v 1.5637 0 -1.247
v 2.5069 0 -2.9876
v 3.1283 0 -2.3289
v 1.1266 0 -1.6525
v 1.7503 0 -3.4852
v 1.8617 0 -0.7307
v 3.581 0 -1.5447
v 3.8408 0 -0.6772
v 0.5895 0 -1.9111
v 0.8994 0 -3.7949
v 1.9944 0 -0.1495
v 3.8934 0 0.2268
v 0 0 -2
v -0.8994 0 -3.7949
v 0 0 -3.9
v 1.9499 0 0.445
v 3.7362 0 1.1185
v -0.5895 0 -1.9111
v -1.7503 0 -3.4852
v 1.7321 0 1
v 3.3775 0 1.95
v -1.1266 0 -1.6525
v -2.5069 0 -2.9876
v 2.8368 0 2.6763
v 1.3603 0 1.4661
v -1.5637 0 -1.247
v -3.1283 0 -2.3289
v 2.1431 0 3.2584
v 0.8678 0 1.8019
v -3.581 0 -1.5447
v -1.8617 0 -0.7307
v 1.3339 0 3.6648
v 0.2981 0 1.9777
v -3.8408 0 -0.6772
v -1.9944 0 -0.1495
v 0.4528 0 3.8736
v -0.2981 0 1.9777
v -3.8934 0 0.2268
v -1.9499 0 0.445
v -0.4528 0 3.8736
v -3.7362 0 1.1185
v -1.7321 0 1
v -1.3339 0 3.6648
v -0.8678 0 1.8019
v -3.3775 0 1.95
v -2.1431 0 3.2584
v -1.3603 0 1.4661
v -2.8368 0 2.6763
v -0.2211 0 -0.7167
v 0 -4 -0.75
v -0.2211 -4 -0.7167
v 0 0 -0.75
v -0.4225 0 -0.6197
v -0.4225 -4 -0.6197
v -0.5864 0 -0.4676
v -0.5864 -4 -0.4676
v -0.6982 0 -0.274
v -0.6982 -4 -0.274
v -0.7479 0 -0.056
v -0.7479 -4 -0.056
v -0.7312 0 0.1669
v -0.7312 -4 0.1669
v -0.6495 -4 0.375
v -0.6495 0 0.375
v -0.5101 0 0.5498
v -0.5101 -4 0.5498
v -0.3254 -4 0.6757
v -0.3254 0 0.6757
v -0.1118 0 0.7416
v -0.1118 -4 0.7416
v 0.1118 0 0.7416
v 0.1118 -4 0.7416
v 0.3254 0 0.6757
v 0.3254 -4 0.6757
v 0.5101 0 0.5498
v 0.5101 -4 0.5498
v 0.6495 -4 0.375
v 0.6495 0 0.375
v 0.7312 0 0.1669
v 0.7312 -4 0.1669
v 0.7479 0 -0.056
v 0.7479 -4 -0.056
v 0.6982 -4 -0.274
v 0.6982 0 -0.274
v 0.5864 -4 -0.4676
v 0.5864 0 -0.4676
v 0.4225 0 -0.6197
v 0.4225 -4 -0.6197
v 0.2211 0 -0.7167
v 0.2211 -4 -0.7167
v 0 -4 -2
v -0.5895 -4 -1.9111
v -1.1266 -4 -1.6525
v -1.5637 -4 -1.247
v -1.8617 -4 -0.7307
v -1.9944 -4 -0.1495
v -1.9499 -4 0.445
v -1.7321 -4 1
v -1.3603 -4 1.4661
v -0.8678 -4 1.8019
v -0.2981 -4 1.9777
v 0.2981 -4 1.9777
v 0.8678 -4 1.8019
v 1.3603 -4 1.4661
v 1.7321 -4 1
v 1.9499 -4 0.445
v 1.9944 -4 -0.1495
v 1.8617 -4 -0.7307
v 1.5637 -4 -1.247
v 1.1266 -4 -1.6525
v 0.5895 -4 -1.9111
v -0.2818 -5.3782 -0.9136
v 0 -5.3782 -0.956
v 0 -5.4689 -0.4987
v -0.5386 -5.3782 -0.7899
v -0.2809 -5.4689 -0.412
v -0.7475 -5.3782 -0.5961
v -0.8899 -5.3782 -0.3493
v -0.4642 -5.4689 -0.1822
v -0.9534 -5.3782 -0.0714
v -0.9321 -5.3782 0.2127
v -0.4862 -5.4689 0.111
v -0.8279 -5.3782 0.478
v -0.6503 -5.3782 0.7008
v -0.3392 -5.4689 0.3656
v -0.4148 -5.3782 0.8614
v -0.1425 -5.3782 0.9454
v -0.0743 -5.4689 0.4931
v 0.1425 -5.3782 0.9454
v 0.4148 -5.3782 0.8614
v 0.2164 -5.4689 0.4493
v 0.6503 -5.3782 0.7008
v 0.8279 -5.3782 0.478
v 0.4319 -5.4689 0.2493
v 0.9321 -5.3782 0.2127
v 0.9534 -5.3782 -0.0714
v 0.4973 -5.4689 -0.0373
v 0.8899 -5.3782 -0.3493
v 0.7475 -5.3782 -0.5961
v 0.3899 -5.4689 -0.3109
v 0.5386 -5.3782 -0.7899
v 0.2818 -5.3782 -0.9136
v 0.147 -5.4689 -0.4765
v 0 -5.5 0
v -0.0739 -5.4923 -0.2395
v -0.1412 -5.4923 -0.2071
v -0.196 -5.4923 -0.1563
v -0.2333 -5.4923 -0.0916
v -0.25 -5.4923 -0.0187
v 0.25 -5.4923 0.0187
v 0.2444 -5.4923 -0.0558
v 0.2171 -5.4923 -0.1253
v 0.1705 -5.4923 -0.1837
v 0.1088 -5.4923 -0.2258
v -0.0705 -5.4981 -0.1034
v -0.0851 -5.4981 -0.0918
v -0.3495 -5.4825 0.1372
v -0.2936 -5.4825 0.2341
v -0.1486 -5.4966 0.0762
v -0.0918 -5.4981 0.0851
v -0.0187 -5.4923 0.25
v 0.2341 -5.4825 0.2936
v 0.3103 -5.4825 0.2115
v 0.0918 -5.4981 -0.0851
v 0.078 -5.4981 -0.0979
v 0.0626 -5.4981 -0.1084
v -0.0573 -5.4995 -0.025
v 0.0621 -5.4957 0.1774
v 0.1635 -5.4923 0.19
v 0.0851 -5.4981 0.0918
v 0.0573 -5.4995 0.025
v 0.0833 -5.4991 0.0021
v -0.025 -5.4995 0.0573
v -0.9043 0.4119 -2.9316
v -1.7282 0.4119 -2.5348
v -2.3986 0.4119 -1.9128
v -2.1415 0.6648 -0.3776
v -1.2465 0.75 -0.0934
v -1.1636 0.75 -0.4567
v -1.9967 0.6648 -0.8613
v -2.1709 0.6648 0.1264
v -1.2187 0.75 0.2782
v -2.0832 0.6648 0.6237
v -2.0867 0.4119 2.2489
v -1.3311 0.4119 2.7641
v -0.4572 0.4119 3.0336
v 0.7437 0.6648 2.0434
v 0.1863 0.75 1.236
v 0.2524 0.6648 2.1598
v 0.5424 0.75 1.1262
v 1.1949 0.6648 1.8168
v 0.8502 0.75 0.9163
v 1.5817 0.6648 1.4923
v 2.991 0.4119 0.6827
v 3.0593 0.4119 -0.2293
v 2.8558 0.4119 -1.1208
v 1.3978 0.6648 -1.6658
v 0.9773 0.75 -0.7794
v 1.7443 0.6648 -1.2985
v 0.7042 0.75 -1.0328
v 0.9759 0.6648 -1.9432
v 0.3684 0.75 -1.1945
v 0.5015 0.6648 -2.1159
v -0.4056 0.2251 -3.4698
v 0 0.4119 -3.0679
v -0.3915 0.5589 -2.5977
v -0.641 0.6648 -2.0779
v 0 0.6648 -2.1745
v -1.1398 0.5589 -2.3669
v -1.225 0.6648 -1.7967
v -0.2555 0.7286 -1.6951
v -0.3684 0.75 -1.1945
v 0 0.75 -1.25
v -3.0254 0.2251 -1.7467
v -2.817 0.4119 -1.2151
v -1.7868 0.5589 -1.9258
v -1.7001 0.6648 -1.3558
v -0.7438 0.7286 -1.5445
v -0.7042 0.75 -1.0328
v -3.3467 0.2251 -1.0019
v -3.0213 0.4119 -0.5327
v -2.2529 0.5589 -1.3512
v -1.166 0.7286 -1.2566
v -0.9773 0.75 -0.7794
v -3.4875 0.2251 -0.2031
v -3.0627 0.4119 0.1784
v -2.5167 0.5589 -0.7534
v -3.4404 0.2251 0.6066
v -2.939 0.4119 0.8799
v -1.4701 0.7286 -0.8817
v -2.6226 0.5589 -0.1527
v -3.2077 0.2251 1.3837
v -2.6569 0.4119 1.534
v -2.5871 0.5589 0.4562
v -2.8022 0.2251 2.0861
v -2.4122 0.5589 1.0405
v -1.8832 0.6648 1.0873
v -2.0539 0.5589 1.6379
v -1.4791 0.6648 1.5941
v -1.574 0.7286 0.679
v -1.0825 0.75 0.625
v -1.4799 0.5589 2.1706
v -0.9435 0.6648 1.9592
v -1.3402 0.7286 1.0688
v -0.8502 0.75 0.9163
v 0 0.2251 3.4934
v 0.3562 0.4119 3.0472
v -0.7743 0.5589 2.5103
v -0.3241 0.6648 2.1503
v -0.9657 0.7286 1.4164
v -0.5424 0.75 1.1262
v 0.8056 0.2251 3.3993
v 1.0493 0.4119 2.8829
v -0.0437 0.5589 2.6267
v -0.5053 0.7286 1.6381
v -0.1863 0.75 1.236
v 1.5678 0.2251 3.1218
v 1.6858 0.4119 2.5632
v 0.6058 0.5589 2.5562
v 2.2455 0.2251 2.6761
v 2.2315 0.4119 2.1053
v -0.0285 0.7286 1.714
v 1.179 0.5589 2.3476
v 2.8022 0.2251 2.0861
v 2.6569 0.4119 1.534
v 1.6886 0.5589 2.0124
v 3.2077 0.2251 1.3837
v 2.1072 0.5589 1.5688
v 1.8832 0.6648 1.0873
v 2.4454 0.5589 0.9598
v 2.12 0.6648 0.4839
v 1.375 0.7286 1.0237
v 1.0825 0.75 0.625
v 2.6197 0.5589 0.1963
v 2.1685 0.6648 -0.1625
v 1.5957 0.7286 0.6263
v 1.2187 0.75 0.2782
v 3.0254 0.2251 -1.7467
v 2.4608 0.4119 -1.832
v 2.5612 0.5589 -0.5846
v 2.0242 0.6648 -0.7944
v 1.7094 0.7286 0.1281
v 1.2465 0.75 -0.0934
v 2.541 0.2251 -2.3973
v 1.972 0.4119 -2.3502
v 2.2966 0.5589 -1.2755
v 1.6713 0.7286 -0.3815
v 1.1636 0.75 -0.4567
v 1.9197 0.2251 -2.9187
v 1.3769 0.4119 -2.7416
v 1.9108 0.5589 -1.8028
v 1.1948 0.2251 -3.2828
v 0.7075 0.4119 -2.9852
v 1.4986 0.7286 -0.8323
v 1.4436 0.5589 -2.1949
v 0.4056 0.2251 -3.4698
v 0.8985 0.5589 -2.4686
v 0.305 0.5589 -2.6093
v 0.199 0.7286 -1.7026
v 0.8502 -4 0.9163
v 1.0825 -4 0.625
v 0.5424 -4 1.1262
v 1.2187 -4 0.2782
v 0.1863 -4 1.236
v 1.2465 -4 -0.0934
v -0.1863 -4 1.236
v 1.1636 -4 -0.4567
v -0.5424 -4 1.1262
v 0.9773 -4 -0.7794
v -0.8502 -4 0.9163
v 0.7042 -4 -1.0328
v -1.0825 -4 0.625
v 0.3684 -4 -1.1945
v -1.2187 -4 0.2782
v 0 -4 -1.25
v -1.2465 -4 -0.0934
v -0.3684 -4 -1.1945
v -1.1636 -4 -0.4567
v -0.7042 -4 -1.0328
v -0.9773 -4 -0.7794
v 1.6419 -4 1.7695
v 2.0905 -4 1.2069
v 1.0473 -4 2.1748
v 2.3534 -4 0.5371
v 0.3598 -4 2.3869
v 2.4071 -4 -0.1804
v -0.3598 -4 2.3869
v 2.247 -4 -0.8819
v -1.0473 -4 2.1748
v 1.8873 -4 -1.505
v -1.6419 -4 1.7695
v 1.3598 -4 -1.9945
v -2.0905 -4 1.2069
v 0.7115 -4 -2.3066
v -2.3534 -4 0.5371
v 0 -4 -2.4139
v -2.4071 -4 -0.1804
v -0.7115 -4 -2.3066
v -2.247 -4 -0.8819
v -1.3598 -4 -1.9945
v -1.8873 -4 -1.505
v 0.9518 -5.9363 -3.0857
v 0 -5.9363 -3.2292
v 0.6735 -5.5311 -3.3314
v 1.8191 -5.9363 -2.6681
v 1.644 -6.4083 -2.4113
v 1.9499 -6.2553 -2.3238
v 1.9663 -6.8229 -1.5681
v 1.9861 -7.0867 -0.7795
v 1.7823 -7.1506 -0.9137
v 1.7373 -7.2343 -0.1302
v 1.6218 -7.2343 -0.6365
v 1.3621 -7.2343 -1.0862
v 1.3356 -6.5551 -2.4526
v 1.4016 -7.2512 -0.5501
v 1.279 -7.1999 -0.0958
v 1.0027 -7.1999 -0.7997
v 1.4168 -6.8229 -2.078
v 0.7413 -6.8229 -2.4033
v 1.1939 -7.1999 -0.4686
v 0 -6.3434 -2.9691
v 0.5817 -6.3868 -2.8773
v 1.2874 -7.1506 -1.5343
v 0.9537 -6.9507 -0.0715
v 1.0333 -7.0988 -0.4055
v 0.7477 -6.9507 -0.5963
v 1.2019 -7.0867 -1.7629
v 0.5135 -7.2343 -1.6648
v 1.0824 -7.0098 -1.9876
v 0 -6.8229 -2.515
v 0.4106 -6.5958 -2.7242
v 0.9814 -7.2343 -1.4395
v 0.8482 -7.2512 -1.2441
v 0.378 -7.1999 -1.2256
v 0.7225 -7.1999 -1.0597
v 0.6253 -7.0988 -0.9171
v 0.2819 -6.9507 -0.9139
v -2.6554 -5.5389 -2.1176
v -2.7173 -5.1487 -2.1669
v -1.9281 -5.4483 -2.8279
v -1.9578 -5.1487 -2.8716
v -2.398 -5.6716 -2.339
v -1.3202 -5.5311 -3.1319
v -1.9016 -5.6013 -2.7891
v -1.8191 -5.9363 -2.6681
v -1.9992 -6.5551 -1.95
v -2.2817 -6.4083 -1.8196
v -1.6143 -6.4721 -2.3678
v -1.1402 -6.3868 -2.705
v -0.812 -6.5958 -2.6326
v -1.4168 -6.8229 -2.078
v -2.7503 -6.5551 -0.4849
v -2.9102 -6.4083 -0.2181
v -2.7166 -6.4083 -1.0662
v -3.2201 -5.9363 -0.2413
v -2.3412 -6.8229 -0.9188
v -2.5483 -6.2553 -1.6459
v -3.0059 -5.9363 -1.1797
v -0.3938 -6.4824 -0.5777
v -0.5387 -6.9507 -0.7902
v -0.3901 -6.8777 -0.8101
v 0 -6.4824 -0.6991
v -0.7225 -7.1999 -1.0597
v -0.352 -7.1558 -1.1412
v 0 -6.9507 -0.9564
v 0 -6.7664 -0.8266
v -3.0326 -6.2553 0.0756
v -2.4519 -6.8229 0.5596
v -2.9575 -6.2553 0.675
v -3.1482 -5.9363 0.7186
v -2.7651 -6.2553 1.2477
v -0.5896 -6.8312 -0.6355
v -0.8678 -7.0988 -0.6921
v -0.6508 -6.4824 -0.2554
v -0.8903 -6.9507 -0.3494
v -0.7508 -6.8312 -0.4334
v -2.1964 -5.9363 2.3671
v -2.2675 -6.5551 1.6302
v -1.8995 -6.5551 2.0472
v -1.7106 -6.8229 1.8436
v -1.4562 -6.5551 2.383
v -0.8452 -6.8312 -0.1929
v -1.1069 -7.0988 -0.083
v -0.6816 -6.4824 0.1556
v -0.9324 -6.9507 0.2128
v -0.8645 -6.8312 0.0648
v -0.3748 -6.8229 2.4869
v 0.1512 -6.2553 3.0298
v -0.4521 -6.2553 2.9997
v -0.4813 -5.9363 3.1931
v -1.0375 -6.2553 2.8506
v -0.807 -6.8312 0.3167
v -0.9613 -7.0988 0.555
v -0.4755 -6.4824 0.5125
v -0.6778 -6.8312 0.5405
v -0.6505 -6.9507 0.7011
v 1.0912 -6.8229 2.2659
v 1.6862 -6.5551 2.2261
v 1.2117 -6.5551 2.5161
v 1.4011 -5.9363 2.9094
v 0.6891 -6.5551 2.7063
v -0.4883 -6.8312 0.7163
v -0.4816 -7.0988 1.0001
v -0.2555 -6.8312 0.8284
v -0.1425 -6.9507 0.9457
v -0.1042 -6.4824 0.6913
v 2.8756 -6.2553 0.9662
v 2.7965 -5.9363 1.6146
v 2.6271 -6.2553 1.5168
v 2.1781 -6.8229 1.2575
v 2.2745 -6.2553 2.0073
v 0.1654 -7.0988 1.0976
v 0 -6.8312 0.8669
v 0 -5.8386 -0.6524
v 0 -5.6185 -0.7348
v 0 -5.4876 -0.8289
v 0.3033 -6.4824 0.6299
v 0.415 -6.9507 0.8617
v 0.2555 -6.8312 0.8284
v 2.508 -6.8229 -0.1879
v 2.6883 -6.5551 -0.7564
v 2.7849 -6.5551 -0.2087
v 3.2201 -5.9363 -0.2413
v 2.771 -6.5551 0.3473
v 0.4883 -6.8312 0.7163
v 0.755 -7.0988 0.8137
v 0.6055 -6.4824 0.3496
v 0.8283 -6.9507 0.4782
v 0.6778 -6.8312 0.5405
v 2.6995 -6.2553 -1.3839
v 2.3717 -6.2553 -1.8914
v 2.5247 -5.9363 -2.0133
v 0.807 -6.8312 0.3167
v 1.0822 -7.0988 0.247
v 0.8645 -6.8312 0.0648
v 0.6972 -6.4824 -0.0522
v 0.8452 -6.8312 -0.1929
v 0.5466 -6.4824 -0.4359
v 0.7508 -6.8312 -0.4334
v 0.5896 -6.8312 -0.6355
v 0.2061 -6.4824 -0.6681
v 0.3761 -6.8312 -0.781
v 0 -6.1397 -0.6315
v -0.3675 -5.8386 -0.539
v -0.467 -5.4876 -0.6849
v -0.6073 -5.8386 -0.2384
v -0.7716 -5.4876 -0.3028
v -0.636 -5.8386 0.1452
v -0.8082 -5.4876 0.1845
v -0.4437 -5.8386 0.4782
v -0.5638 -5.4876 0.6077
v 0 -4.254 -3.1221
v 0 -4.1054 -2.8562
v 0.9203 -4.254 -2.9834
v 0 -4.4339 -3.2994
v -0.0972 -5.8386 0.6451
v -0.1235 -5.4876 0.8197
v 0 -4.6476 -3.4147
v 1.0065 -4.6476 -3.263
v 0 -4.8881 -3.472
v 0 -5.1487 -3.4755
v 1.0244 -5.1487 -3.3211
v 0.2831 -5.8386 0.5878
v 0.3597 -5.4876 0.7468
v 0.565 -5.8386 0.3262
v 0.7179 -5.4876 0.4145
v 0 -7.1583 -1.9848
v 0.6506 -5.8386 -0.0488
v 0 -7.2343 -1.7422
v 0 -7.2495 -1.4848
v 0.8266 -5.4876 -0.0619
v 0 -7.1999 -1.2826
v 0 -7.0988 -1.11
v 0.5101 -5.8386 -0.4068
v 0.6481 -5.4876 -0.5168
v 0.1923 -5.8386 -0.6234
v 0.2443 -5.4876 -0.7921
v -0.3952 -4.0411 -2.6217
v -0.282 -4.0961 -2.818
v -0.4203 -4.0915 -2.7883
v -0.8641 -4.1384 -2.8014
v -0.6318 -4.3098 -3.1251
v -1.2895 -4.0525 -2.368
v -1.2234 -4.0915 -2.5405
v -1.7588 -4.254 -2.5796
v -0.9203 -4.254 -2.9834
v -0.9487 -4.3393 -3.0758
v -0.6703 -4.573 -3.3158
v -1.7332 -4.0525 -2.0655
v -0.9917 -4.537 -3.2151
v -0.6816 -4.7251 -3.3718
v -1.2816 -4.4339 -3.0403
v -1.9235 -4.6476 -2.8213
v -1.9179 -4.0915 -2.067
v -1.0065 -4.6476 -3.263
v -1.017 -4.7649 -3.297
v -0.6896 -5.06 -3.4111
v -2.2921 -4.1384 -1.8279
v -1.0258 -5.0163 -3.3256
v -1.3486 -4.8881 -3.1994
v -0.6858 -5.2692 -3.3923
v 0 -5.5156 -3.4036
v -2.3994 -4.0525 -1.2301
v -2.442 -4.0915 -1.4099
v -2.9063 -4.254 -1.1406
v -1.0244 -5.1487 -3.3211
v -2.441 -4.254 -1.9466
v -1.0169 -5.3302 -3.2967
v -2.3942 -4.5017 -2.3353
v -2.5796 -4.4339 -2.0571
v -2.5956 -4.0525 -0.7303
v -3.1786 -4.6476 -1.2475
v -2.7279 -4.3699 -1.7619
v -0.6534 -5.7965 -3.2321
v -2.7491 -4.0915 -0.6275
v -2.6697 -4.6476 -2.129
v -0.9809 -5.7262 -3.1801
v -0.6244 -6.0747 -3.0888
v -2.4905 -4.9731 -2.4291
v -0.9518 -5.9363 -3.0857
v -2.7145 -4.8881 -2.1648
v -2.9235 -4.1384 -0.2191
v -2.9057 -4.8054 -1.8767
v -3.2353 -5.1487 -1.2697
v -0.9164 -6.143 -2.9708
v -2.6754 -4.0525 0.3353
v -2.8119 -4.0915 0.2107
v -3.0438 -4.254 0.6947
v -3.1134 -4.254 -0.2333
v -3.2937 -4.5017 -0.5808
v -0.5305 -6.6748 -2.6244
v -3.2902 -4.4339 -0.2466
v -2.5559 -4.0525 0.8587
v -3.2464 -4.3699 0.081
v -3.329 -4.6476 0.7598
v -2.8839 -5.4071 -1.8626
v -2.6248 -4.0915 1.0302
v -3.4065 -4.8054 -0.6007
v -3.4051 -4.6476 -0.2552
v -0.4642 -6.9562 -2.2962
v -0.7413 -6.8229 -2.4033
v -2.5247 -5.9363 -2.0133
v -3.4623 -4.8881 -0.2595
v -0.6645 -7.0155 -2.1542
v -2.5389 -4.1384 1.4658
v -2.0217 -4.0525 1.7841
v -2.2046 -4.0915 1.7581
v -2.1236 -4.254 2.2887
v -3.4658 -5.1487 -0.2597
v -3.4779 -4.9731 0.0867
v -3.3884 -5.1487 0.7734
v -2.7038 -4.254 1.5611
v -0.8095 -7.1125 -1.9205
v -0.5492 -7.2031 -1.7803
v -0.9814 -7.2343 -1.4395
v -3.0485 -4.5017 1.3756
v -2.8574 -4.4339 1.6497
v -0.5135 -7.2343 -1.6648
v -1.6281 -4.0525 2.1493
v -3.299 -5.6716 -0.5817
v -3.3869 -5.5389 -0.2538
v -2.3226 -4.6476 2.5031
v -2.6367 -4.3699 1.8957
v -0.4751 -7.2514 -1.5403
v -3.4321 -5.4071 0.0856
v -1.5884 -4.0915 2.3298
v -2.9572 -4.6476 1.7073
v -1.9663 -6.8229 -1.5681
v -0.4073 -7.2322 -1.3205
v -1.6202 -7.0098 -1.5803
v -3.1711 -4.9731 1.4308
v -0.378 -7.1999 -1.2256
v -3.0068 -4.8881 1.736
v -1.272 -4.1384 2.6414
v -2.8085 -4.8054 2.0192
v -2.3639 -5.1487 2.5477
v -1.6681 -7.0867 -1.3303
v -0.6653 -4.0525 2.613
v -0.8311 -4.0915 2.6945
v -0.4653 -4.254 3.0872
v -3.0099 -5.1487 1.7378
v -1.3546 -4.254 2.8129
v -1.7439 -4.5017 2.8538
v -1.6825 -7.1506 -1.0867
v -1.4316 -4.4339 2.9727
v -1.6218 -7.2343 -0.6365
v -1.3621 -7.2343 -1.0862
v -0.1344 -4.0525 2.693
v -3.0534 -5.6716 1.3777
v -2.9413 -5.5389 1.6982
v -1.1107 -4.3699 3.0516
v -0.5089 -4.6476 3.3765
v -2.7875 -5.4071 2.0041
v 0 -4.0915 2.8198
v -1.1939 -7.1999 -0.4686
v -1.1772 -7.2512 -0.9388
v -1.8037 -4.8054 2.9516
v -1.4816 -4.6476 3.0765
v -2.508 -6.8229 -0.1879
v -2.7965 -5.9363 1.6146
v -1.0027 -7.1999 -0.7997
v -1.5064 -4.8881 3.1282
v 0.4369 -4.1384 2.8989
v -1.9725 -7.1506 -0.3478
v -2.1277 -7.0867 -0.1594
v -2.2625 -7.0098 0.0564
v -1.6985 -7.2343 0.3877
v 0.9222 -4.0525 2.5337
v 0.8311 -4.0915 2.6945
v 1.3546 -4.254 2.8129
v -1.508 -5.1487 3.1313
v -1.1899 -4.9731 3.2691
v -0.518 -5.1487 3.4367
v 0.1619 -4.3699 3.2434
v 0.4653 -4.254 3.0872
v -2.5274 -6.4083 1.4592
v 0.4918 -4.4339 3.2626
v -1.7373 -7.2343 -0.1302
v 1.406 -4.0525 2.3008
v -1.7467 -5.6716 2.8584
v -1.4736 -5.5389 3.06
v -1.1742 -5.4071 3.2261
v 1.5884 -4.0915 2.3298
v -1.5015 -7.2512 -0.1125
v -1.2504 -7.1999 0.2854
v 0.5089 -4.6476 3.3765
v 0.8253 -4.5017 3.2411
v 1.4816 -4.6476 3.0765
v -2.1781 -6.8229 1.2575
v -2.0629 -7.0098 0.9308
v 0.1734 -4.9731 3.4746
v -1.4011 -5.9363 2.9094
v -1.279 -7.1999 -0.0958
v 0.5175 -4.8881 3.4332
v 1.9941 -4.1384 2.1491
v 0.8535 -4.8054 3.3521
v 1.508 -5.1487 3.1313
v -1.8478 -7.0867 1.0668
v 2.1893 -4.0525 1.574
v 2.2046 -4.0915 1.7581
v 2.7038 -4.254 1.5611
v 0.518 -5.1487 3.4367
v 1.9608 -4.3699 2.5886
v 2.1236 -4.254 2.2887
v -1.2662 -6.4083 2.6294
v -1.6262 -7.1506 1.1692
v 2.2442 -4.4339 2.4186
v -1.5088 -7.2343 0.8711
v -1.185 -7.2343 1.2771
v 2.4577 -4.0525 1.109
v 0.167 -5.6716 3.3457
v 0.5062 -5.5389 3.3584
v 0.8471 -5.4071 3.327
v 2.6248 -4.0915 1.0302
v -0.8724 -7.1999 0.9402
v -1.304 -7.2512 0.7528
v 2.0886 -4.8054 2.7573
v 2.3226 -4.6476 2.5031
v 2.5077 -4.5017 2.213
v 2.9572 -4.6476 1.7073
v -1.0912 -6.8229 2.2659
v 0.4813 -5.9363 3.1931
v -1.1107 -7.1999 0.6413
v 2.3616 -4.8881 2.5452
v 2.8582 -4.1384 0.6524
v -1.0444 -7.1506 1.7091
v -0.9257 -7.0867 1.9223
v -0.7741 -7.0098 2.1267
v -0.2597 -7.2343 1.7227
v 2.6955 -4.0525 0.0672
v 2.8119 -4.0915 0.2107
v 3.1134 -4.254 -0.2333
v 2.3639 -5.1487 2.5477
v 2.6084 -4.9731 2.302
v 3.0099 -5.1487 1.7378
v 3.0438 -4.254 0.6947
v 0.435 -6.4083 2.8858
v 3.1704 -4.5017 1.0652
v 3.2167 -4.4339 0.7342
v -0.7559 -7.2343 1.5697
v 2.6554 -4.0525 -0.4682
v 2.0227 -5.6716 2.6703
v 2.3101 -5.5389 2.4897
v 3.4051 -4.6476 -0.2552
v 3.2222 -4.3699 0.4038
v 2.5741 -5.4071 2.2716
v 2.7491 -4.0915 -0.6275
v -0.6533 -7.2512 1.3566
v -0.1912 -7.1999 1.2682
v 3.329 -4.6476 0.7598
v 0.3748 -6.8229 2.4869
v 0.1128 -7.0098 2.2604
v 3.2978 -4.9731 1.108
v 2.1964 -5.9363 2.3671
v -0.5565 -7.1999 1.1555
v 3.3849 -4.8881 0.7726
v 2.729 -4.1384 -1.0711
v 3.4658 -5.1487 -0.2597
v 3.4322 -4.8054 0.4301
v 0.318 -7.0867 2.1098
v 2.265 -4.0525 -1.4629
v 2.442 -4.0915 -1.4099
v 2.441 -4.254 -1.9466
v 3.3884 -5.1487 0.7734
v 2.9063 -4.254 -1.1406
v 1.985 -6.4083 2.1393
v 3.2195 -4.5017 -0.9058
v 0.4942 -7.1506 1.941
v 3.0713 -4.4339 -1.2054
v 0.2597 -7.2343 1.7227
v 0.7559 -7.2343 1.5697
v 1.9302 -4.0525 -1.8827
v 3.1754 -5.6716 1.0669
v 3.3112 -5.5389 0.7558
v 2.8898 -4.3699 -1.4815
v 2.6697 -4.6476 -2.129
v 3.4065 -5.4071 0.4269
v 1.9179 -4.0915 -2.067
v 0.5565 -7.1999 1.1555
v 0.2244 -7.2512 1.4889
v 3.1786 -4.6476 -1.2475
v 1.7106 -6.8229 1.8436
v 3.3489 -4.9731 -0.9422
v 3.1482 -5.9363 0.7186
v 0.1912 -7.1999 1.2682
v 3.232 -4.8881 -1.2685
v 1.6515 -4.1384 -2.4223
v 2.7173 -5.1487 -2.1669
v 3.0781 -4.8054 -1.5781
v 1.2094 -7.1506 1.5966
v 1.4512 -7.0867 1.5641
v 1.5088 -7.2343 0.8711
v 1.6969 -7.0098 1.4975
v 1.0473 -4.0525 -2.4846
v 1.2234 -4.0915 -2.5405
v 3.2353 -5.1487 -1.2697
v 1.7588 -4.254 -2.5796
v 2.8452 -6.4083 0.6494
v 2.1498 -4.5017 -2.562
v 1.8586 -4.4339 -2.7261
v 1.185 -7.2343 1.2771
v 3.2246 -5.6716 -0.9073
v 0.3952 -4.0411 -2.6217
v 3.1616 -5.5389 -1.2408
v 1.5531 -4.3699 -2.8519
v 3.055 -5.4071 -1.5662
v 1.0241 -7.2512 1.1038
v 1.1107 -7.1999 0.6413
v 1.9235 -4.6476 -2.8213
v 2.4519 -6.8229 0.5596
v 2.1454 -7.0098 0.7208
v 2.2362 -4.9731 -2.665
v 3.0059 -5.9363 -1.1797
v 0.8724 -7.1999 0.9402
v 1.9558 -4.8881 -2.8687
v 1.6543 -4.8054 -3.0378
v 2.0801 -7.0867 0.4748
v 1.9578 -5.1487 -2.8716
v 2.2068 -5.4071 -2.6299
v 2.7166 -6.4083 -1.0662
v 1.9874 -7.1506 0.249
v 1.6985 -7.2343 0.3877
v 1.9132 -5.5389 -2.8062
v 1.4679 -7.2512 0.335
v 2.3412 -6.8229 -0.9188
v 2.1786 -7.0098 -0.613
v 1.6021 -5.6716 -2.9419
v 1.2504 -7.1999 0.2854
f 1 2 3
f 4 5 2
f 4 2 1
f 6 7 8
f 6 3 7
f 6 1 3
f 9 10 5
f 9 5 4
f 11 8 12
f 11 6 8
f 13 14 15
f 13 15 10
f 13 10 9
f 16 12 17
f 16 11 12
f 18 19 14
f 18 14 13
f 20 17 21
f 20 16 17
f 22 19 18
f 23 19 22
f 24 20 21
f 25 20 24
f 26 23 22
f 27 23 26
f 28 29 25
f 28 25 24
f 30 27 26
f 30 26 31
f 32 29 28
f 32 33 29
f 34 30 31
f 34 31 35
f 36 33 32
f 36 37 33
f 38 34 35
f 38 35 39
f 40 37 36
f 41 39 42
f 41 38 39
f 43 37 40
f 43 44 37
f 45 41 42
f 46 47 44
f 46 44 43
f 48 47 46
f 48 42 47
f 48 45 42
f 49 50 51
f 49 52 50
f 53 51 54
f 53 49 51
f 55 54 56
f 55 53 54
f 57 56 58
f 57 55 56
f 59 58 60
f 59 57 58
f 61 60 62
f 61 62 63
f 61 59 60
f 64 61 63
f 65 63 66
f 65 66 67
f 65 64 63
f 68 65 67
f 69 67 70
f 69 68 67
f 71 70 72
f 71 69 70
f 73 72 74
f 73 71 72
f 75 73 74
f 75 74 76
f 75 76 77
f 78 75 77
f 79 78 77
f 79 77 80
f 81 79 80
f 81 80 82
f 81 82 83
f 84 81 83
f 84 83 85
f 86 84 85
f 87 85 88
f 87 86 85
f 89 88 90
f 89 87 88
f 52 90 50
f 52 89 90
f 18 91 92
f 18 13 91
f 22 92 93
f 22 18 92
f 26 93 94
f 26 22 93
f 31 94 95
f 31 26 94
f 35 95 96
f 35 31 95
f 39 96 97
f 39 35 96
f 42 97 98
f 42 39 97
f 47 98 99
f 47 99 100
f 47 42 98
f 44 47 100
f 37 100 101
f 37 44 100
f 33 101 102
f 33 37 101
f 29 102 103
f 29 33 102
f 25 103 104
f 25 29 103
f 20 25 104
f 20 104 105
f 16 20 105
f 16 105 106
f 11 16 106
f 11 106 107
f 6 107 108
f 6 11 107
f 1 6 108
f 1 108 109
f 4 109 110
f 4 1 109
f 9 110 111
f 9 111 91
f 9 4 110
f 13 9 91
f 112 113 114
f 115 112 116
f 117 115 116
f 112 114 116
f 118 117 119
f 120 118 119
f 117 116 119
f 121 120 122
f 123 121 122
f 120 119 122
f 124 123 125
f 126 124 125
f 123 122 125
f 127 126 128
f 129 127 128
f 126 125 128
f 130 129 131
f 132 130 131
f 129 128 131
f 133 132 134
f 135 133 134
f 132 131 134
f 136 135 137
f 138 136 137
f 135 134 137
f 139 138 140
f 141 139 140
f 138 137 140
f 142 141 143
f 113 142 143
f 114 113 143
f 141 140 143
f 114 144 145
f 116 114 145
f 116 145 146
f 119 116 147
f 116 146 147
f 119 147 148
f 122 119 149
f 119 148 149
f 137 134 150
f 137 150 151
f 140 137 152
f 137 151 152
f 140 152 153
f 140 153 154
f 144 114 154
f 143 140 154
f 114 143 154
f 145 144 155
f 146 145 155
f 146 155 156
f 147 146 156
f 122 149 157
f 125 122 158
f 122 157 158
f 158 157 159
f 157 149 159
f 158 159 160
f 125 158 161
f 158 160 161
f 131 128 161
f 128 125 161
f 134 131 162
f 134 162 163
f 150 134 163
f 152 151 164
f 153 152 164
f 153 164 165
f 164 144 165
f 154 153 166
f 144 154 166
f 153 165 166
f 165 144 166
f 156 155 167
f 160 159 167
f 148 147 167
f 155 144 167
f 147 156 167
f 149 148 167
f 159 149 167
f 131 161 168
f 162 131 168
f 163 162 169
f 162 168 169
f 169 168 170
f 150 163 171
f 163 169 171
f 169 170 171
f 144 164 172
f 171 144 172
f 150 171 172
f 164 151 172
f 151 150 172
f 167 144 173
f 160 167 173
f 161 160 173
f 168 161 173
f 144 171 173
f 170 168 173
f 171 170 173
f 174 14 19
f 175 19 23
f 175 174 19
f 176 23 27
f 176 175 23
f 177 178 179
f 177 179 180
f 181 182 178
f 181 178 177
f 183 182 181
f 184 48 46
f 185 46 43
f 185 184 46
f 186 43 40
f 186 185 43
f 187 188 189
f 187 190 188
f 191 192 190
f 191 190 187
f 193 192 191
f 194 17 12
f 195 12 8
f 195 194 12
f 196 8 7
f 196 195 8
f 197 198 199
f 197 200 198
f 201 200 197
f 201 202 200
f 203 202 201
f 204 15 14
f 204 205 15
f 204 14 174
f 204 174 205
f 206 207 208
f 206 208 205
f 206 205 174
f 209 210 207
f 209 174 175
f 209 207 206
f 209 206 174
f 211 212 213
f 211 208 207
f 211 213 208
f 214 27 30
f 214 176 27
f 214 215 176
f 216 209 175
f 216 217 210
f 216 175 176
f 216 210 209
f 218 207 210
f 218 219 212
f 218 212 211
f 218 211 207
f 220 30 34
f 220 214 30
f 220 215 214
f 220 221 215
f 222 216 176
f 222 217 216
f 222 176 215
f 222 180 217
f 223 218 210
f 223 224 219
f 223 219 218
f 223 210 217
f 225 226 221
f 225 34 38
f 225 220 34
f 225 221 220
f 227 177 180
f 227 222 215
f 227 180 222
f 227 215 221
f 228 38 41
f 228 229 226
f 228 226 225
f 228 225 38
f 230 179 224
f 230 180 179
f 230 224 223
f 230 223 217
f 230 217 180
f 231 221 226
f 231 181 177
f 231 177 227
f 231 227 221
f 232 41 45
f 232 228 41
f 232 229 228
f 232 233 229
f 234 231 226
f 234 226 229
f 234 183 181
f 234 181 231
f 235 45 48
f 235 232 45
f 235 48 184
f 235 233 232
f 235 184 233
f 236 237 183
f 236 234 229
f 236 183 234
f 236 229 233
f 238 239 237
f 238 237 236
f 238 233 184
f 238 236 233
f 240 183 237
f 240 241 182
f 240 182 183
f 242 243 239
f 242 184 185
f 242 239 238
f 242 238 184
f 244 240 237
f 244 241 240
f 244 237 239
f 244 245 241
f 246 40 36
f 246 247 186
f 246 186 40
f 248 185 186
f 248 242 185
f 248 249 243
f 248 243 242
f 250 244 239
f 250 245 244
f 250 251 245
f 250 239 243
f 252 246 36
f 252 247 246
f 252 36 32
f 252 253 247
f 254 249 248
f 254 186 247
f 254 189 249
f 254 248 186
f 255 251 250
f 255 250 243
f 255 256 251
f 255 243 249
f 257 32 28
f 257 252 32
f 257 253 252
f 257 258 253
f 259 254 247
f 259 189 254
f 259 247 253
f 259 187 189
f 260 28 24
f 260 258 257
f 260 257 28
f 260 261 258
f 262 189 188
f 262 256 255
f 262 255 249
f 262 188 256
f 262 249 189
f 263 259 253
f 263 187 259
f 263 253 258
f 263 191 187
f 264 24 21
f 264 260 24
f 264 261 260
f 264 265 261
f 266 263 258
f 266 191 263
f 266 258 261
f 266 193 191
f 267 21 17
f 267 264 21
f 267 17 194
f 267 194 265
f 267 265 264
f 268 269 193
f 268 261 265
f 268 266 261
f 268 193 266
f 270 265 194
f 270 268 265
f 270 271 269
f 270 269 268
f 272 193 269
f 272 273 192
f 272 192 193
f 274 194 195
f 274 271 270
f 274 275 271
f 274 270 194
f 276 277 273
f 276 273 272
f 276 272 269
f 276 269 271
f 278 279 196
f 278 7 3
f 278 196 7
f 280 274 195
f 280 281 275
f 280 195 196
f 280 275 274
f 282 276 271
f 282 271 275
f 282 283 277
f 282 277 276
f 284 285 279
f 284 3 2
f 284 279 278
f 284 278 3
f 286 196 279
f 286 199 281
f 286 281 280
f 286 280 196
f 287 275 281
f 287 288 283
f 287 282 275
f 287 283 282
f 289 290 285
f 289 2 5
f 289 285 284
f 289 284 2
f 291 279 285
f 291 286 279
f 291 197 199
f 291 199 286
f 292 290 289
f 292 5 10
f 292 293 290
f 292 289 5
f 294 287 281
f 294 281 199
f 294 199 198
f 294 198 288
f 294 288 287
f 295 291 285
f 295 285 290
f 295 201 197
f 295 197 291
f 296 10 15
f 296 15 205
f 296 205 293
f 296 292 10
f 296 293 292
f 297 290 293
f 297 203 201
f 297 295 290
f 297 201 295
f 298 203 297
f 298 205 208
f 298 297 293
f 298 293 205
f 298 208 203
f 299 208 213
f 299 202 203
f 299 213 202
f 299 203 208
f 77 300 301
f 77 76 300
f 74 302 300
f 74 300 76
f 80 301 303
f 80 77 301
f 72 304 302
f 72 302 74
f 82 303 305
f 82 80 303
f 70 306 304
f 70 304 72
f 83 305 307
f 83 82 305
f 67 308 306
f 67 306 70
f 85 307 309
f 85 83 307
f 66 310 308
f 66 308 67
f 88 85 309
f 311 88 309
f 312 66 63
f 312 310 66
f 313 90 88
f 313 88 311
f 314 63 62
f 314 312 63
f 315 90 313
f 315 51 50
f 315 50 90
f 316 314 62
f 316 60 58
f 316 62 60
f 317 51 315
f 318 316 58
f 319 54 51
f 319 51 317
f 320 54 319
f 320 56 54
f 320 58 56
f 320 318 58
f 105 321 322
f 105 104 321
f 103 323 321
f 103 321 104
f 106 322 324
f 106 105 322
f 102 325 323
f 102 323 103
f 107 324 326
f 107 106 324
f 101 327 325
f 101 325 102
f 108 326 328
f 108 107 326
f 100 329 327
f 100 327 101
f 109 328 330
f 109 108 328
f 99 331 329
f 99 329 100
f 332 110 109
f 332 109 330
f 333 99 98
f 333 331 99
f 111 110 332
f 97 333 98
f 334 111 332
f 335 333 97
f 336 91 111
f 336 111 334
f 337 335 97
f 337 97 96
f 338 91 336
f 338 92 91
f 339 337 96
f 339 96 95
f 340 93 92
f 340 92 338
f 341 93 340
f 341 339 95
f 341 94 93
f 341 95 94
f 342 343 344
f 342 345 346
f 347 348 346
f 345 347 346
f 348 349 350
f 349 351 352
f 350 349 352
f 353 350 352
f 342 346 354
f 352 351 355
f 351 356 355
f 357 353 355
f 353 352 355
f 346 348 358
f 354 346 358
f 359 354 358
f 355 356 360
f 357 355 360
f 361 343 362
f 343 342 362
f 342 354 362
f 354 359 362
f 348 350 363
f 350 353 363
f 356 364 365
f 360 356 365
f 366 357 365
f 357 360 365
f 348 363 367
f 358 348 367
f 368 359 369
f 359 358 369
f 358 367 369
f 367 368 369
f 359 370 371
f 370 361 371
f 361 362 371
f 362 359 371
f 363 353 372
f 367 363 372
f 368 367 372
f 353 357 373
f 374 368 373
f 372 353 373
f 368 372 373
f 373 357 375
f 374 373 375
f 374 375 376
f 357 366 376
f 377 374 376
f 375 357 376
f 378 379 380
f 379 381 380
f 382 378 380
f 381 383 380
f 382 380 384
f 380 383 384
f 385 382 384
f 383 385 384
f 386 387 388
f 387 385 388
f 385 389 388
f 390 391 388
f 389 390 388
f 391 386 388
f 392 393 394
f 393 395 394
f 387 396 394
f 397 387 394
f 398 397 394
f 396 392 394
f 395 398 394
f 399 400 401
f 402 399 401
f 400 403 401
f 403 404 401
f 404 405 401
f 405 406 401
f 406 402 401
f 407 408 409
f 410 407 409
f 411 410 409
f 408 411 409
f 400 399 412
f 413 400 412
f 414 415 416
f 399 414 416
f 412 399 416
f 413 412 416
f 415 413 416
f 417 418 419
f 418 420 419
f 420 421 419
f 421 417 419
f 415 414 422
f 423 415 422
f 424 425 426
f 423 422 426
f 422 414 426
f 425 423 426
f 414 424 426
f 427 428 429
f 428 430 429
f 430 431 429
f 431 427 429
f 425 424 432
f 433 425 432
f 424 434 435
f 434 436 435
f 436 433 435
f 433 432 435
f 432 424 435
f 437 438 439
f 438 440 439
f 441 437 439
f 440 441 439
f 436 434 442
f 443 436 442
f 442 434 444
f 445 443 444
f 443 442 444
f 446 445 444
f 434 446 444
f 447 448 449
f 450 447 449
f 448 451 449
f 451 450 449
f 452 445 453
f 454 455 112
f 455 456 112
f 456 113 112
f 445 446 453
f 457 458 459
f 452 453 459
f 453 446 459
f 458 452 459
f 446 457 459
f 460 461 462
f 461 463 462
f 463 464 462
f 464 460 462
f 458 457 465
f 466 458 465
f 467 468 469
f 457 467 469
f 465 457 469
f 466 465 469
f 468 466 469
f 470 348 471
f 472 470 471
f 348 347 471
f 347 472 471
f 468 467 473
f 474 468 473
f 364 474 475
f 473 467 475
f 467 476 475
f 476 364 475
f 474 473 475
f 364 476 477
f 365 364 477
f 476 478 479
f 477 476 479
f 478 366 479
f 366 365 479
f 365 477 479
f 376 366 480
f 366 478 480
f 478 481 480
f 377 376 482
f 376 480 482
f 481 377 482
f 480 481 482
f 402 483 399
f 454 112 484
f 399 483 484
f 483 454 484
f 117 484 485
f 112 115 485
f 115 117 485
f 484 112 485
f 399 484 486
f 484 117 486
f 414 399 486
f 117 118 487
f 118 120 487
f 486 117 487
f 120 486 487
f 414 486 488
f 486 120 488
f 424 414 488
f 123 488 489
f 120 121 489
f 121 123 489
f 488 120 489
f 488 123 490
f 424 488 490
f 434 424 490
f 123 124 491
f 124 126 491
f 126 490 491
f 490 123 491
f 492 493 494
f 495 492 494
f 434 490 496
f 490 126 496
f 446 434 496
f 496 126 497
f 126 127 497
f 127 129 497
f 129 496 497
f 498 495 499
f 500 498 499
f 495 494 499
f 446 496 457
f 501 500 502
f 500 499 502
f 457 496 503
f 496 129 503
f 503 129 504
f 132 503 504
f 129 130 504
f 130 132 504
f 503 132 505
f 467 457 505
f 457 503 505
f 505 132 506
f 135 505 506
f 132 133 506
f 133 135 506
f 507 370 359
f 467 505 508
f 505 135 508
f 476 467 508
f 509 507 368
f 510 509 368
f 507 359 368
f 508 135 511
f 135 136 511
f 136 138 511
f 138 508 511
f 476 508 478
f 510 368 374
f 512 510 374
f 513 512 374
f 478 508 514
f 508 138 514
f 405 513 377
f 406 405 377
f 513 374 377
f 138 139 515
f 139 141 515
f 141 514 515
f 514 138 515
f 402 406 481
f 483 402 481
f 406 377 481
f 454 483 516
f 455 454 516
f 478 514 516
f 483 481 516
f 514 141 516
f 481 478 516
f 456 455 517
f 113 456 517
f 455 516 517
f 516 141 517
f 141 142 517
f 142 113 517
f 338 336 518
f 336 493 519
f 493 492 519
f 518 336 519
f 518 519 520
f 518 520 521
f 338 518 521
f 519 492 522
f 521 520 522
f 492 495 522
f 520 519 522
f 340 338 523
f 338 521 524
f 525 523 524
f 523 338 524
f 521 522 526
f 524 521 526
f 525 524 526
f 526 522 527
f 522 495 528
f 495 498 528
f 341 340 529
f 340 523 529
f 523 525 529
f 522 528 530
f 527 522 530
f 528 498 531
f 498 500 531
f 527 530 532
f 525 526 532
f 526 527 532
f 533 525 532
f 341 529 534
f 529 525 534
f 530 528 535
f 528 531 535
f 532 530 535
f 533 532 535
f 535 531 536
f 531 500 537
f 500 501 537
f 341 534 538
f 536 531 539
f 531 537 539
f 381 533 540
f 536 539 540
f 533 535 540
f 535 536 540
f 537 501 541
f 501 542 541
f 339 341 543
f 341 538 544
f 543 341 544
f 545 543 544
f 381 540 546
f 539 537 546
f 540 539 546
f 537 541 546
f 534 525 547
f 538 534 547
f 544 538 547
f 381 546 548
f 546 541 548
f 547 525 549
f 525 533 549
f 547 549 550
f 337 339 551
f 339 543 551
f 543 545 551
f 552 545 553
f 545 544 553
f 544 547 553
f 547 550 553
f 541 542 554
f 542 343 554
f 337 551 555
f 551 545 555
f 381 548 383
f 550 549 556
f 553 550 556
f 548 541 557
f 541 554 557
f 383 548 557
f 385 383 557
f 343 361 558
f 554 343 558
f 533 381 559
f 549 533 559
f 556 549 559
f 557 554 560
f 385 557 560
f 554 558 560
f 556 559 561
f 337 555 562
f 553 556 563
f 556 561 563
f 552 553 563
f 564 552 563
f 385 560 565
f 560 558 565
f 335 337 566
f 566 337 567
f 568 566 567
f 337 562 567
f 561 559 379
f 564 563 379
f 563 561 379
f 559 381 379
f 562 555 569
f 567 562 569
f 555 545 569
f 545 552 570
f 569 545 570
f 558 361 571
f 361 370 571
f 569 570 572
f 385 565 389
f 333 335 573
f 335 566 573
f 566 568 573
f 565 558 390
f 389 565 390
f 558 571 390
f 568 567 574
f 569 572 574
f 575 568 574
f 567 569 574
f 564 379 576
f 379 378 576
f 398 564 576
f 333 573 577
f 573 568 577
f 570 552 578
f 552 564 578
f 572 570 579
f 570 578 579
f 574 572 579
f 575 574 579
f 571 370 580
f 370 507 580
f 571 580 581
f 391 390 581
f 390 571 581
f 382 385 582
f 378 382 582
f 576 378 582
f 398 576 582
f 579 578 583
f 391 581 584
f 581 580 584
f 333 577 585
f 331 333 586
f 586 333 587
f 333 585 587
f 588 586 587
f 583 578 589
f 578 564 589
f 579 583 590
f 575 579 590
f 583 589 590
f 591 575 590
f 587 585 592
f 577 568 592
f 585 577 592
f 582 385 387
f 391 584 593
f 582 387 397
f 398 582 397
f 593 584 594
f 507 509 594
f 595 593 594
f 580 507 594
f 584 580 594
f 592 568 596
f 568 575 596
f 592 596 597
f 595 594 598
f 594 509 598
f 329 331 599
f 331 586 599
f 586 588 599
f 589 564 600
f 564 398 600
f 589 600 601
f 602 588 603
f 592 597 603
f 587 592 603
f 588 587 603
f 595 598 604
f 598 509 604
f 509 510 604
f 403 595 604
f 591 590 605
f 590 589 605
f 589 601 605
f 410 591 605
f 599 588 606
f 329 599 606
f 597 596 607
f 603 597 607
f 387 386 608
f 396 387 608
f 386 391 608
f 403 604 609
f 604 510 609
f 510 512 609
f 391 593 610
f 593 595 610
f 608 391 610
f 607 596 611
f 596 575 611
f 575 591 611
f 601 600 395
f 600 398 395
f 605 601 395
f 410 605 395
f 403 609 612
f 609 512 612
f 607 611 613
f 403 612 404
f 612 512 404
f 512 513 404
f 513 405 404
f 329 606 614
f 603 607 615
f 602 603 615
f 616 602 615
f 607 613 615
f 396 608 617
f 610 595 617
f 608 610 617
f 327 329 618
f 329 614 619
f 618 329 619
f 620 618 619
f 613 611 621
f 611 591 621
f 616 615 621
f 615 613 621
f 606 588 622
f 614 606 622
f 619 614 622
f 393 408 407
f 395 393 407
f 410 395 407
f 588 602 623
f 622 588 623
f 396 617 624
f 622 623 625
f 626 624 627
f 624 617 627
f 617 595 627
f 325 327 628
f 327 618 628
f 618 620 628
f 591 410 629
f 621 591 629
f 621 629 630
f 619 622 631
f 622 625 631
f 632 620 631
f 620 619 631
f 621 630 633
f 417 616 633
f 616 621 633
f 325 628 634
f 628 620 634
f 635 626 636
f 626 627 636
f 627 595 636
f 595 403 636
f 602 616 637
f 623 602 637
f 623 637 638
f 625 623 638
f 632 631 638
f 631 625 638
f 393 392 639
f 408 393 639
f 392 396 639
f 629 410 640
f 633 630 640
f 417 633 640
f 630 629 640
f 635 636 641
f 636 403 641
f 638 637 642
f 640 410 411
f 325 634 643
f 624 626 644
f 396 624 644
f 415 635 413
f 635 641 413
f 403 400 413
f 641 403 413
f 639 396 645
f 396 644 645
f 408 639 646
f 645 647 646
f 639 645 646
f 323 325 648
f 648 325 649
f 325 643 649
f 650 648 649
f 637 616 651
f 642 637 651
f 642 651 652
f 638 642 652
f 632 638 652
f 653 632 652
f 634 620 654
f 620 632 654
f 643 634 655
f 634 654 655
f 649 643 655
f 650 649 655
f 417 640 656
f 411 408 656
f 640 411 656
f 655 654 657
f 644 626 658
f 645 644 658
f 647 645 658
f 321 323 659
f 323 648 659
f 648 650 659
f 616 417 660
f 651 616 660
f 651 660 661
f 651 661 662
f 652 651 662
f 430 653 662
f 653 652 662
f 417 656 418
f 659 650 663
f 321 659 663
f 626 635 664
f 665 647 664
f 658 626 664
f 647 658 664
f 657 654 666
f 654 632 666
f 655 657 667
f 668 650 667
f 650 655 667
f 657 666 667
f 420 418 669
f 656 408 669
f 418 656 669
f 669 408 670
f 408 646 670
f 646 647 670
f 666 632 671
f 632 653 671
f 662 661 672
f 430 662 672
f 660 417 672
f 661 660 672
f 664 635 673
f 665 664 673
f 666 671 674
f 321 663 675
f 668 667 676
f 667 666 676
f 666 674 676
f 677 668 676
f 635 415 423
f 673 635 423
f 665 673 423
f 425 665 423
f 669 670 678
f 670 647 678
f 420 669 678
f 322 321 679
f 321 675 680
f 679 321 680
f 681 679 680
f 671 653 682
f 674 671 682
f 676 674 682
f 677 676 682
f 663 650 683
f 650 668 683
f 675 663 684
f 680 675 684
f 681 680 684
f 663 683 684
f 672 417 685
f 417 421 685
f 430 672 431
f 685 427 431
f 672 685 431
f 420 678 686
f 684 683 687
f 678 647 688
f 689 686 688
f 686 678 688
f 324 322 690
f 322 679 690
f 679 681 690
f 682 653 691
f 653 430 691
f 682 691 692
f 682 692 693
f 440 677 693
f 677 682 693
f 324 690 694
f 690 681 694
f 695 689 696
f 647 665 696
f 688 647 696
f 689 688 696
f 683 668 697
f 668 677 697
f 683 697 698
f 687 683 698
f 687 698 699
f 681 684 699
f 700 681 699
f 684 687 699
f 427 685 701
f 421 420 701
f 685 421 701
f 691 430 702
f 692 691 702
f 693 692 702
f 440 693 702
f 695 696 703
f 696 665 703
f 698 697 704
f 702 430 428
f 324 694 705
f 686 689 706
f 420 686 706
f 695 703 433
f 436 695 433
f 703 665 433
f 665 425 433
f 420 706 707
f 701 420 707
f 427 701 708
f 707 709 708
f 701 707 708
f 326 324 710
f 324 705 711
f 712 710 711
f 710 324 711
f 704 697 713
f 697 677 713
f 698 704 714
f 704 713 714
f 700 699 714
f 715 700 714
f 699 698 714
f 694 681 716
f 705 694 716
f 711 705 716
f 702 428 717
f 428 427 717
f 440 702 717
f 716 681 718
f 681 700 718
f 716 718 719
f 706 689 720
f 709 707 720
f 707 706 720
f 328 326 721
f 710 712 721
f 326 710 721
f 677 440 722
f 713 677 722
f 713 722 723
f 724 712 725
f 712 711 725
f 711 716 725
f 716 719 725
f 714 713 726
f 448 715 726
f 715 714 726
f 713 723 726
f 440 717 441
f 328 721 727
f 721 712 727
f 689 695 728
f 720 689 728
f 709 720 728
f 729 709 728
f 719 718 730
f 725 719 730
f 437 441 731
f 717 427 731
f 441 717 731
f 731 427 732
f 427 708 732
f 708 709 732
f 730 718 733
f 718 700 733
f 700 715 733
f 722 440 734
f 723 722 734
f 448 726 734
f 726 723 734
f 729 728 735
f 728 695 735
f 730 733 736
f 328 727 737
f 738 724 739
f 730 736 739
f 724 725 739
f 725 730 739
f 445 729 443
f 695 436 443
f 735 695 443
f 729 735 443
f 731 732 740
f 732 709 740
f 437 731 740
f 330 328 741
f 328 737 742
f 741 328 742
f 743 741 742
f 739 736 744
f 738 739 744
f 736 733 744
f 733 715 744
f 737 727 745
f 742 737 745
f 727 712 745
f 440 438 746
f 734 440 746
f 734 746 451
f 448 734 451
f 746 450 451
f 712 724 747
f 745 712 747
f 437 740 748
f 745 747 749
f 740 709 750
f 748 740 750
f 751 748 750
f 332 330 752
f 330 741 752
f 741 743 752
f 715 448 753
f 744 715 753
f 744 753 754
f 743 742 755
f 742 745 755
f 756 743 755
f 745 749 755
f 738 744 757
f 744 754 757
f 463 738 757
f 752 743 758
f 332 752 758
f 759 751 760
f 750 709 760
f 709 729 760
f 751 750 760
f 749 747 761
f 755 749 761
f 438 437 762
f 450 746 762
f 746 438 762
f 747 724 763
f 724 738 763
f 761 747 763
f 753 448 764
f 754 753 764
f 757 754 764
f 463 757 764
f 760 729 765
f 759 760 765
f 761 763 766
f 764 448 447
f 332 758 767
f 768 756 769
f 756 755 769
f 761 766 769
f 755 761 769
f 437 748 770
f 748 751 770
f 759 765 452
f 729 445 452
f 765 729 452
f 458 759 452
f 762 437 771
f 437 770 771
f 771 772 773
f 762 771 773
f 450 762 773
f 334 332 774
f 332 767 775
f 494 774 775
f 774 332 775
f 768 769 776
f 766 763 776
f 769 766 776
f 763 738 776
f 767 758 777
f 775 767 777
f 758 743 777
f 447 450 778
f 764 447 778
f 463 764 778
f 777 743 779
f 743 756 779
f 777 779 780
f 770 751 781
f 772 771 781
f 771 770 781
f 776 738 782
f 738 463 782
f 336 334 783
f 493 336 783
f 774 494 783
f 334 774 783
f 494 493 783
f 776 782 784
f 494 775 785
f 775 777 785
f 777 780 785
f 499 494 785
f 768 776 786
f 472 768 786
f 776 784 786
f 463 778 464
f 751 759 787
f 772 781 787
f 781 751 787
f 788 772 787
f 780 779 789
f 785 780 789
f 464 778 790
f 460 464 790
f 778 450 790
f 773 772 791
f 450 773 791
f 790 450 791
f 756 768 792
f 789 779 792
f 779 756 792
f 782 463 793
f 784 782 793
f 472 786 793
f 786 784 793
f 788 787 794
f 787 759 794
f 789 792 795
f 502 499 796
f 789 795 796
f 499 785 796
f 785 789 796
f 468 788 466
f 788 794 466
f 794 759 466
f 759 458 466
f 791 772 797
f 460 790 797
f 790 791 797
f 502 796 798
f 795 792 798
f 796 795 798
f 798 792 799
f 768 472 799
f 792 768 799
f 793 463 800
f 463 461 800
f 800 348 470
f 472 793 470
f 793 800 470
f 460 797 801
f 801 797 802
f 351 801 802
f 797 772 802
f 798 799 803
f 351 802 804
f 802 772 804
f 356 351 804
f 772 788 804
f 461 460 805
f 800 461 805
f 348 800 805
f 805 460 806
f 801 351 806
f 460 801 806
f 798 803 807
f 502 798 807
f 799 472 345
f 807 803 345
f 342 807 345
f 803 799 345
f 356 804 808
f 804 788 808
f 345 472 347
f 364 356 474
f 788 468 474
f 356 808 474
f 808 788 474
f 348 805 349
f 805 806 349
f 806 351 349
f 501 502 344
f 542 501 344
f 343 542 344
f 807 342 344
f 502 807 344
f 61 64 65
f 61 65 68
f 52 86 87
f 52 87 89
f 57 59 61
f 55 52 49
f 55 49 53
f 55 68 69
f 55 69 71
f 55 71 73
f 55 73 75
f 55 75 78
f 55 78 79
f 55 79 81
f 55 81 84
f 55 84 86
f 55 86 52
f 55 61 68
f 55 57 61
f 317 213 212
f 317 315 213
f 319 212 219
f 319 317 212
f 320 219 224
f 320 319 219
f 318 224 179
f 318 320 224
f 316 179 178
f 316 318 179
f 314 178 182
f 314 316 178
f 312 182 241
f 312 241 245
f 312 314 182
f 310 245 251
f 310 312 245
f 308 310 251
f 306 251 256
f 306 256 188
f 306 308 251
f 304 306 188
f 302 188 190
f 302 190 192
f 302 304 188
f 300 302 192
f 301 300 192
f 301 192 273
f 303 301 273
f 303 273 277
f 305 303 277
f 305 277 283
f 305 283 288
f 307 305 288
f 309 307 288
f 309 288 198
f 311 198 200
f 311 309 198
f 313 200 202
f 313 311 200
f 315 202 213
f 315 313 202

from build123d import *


with BuildPart() as part:
    # Szkic1 → Obrót1 (revolve)
    with BuildSketch(Plane(origin=(0, 0, 0), x_dir=(0, 0, -1), z_dir=(1, 0, 0)), mode=Mode.PRIVATE) as obr_t1_sk:
        with BuildLine():
            Line((0, 0), (0, -4))
            Line((0, -4), (0, -5.5))
            add(Edge.make_bspline(
                [(-0.956030427, -5.378190671), (-0.520263876, -5.5), (0, -5.5)],
                knots=[0.992852221, 0.992852221, 0.992852221, 1.570796327, 1.570796327, 1.570796327], degree=2, weights=[1, 0.958537313, 1]))
            add(Edge.make_bspline(
                [(-2.413891755, -4), (-3.858559437, -4.163296686), (-3.558358928, -6.322980362), (-0.971318098, -7.871940016), (-0.341145137, -5.79203191), (-0.956030427, -5.378190671)],
                knots=[0, 0, 0, 0, 0.454219308, 0.705200672, 1, 1, 1, 1], degree=3))
            Line((-2.413891755, -4), (-2, -4))
            Line((-2, -4), (-2, 0))
            Line((-2, 0), (-3.9, 0))
            ThreePointArc((-3.9, 0), (-2.627043935, 0.558888572), (-1.25, 0.75))
            Line((-1.25, 0.75), (-1.25, -4))
            Line((-1.25, -4), (-0.75, -4))
            Line((-0.75, -4), (-0.75, 0))
            Line((-0.75, 0), (0, 0))
        make_face()
    revolve(obr_t1_sk.sketch.rotate(Axis((0, 0, 0), (0, 1, 0)), 180), axis=Axis((0, 0, 0), (0, 1, 0)))


solid = part.part
